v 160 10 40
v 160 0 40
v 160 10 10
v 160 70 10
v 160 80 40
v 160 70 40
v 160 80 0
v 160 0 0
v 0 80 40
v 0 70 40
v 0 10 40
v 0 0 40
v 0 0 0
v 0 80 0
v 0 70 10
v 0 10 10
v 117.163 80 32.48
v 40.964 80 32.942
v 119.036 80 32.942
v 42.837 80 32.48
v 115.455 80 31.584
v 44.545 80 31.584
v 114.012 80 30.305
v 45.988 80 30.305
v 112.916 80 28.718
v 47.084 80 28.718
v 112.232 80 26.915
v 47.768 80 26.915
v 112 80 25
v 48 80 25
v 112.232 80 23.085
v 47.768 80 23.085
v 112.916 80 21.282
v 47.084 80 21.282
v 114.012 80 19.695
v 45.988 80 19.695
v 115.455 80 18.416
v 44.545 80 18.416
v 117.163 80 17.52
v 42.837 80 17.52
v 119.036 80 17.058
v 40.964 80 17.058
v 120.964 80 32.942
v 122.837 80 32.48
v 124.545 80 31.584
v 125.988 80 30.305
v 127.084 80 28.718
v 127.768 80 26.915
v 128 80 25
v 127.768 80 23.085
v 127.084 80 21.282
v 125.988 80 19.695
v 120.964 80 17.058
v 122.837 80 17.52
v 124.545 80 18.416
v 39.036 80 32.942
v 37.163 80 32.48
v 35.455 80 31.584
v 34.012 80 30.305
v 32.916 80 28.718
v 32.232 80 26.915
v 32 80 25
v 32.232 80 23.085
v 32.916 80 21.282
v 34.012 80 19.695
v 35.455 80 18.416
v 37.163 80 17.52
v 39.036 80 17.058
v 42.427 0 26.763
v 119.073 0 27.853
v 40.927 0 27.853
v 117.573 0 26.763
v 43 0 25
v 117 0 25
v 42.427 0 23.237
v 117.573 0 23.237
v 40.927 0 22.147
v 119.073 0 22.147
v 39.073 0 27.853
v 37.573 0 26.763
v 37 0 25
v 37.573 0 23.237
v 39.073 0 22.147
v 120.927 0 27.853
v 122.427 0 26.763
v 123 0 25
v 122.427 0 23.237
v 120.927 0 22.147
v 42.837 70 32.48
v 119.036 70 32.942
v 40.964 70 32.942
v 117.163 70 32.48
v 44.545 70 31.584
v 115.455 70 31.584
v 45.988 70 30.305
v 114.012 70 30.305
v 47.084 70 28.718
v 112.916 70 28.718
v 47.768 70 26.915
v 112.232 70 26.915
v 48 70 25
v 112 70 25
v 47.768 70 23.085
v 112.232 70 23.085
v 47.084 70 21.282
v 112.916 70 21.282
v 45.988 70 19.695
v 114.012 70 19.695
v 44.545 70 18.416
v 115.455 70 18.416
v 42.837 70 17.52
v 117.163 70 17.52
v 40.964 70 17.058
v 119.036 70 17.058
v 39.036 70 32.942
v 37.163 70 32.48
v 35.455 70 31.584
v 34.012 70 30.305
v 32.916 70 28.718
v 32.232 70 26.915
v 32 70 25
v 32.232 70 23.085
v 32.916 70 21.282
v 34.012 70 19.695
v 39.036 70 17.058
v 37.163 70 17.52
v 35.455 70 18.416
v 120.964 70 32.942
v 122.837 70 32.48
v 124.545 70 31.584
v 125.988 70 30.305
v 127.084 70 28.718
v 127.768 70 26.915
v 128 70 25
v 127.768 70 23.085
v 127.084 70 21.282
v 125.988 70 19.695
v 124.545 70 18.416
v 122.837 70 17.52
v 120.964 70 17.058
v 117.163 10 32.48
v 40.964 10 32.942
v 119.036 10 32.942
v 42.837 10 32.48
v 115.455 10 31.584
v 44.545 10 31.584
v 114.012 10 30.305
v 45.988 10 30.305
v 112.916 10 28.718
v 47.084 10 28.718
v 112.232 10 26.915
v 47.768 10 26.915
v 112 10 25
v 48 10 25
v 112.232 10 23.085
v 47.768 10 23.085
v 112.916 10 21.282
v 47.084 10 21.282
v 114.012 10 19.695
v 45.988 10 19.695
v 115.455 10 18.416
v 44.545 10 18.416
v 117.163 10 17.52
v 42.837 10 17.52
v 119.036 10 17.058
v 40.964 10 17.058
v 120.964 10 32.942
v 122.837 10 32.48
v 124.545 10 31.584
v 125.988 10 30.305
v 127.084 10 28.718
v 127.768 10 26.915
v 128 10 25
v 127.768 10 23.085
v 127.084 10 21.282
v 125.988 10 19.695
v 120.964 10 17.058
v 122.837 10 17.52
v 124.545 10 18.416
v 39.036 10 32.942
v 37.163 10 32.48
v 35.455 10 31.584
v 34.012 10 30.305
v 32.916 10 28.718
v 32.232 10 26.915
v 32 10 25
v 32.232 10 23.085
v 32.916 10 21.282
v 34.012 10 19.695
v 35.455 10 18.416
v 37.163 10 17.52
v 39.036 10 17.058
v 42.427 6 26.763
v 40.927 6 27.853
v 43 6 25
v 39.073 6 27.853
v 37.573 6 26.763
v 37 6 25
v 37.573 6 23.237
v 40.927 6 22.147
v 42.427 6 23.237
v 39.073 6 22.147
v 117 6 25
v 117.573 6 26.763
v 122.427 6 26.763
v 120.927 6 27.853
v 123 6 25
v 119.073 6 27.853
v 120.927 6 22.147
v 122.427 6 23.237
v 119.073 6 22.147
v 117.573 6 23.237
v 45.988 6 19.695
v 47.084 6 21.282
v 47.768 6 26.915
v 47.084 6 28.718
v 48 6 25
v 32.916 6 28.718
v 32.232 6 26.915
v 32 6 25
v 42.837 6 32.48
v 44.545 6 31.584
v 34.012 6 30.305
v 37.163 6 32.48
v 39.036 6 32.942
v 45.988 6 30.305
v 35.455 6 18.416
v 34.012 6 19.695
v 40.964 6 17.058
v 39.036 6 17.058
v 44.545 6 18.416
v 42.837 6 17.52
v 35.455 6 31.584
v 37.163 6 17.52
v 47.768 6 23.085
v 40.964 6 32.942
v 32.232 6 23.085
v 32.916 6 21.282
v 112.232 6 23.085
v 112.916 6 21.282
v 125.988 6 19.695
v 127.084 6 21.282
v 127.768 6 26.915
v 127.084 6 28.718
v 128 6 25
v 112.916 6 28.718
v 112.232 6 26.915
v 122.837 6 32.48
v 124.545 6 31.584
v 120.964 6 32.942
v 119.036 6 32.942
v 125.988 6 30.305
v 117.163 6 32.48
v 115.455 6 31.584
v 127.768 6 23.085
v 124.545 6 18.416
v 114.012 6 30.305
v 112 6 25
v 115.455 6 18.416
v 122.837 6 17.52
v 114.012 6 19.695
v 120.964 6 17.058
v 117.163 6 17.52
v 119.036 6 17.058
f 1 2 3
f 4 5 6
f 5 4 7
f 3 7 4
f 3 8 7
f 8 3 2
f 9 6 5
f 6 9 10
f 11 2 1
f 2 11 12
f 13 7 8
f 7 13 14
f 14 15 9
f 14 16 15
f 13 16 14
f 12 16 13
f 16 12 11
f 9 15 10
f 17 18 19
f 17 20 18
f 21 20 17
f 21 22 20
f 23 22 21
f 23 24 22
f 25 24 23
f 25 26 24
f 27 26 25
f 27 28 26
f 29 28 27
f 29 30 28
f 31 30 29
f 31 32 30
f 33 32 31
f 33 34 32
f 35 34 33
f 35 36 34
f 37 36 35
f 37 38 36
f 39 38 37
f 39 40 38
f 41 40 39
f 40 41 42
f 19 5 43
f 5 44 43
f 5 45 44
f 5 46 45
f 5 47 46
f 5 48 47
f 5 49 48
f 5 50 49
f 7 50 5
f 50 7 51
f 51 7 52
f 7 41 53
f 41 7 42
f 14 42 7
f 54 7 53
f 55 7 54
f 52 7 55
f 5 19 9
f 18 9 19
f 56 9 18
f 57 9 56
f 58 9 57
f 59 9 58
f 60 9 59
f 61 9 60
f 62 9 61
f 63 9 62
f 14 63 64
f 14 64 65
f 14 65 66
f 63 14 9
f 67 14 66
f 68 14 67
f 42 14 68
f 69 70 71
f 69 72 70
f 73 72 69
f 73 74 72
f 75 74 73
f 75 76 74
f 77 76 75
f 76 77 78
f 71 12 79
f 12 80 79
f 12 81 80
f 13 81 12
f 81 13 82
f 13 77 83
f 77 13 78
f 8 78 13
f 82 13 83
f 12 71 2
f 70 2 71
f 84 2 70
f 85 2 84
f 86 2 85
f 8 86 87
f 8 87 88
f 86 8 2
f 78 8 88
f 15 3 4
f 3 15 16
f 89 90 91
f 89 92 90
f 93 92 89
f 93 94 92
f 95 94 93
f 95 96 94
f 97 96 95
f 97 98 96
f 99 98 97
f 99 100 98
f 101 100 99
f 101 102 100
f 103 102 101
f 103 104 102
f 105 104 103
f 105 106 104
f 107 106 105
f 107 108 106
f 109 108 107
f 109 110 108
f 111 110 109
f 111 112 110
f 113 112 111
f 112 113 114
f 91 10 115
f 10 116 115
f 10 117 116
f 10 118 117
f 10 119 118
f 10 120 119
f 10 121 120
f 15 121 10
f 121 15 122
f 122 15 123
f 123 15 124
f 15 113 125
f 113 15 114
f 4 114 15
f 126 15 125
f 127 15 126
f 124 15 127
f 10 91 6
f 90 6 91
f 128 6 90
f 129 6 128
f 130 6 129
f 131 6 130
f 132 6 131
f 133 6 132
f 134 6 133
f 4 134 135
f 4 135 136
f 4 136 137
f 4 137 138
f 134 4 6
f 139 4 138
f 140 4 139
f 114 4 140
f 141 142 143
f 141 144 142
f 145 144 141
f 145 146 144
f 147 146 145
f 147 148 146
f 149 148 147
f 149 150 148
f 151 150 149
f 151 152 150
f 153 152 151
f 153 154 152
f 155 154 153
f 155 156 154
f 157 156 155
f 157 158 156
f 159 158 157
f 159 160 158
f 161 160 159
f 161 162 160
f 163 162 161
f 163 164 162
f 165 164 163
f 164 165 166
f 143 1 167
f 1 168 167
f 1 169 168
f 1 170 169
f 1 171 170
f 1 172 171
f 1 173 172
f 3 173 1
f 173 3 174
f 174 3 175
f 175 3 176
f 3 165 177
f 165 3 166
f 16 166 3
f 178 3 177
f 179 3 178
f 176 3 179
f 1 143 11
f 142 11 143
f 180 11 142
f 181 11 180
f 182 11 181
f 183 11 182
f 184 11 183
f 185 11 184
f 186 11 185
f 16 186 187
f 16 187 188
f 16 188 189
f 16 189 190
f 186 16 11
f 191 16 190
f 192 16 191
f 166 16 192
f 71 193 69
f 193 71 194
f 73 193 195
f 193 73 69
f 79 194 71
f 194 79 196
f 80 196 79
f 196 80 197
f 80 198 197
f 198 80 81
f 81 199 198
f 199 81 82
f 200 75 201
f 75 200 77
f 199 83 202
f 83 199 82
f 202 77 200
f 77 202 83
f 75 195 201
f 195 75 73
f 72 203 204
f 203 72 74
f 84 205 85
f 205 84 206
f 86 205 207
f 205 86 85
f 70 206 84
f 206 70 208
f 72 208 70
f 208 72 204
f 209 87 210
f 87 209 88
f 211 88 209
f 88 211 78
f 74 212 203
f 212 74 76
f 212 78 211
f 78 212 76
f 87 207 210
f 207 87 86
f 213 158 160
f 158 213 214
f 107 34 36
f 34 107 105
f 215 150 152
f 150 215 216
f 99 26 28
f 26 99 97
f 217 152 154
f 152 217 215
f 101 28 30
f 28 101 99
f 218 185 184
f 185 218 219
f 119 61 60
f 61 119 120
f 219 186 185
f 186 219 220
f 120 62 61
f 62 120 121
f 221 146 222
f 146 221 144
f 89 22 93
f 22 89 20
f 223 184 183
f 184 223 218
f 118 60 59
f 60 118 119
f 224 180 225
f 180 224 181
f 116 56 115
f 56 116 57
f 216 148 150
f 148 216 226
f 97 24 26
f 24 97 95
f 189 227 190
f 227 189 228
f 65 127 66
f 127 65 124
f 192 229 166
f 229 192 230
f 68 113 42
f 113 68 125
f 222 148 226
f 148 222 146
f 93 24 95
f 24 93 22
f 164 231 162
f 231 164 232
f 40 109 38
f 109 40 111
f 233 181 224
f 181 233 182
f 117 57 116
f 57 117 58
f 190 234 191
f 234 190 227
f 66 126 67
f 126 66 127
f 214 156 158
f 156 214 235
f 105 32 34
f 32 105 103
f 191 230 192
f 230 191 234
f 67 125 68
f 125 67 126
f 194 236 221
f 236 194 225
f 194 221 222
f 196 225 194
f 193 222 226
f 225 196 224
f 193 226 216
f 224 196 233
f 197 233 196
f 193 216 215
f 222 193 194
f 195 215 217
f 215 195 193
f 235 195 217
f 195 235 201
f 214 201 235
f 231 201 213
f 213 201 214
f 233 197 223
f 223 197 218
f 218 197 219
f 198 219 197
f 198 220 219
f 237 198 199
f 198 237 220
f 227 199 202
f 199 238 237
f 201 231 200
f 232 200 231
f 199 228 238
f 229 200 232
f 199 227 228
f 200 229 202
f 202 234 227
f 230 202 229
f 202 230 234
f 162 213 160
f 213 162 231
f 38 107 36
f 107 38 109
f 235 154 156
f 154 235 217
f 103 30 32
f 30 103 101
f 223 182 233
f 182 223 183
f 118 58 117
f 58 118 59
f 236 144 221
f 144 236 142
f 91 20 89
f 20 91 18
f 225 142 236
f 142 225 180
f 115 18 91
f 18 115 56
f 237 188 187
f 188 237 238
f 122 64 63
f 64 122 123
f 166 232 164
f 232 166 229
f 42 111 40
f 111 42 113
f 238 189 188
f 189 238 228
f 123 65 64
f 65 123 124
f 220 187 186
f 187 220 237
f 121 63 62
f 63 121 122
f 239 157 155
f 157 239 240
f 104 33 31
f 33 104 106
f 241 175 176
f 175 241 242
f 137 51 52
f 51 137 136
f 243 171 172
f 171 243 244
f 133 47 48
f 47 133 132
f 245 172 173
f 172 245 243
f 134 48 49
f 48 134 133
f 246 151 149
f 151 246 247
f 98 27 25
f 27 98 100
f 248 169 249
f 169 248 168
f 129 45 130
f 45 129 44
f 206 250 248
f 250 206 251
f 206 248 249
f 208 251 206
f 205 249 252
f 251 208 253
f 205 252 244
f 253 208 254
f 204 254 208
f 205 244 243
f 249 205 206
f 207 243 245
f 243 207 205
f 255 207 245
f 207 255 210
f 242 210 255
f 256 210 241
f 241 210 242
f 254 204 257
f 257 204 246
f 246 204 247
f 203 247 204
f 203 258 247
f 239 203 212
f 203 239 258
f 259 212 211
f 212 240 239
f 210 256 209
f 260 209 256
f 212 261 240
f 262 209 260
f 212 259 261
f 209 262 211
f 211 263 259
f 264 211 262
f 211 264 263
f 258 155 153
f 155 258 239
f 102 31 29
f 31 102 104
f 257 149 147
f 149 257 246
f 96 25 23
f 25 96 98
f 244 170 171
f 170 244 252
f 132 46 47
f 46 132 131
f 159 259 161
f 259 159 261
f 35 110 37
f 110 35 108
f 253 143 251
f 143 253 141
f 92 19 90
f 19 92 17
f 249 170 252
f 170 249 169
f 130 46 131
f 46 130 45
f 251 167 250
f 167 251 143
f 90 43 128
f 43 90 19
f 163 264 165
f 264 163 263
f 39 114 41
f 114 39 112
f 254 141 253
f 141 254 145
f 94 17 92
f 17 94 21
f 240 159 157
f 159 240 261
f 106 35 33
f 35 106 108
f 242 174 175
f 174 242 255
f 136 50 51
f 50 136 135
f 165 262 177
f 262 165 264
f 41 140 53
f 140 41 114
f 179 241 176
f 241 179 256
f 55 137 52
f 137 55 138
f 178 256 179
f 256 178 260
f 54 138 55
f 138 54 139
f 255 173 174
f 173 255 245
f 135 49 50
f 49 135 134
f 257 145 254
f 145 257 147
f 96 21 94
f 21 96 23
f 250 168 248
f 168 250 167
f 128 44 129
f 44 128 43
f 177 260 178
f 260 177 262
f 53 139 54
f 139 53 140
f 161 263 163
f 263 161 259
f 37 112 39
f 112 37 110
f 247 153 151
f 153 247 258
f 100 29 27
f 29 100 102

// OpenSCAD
difference()
{
  cube([160,80,40]);
  translate([-5,10,10]) cube([220,60,50]);
  translate([40,15,25]) rotate([90,0,0]) cylinder(d=6,h=30);
  translate([120,15,25]) rotate([90,0,0]) cylinder(d=6,h=30);
  translate([40,86,25]) rotate([90,0,0]) cylinder(d=16,h=80);
  translate([120,86,25]) rotate([90,0,0]) cylinder(d=16,h=80);
}
